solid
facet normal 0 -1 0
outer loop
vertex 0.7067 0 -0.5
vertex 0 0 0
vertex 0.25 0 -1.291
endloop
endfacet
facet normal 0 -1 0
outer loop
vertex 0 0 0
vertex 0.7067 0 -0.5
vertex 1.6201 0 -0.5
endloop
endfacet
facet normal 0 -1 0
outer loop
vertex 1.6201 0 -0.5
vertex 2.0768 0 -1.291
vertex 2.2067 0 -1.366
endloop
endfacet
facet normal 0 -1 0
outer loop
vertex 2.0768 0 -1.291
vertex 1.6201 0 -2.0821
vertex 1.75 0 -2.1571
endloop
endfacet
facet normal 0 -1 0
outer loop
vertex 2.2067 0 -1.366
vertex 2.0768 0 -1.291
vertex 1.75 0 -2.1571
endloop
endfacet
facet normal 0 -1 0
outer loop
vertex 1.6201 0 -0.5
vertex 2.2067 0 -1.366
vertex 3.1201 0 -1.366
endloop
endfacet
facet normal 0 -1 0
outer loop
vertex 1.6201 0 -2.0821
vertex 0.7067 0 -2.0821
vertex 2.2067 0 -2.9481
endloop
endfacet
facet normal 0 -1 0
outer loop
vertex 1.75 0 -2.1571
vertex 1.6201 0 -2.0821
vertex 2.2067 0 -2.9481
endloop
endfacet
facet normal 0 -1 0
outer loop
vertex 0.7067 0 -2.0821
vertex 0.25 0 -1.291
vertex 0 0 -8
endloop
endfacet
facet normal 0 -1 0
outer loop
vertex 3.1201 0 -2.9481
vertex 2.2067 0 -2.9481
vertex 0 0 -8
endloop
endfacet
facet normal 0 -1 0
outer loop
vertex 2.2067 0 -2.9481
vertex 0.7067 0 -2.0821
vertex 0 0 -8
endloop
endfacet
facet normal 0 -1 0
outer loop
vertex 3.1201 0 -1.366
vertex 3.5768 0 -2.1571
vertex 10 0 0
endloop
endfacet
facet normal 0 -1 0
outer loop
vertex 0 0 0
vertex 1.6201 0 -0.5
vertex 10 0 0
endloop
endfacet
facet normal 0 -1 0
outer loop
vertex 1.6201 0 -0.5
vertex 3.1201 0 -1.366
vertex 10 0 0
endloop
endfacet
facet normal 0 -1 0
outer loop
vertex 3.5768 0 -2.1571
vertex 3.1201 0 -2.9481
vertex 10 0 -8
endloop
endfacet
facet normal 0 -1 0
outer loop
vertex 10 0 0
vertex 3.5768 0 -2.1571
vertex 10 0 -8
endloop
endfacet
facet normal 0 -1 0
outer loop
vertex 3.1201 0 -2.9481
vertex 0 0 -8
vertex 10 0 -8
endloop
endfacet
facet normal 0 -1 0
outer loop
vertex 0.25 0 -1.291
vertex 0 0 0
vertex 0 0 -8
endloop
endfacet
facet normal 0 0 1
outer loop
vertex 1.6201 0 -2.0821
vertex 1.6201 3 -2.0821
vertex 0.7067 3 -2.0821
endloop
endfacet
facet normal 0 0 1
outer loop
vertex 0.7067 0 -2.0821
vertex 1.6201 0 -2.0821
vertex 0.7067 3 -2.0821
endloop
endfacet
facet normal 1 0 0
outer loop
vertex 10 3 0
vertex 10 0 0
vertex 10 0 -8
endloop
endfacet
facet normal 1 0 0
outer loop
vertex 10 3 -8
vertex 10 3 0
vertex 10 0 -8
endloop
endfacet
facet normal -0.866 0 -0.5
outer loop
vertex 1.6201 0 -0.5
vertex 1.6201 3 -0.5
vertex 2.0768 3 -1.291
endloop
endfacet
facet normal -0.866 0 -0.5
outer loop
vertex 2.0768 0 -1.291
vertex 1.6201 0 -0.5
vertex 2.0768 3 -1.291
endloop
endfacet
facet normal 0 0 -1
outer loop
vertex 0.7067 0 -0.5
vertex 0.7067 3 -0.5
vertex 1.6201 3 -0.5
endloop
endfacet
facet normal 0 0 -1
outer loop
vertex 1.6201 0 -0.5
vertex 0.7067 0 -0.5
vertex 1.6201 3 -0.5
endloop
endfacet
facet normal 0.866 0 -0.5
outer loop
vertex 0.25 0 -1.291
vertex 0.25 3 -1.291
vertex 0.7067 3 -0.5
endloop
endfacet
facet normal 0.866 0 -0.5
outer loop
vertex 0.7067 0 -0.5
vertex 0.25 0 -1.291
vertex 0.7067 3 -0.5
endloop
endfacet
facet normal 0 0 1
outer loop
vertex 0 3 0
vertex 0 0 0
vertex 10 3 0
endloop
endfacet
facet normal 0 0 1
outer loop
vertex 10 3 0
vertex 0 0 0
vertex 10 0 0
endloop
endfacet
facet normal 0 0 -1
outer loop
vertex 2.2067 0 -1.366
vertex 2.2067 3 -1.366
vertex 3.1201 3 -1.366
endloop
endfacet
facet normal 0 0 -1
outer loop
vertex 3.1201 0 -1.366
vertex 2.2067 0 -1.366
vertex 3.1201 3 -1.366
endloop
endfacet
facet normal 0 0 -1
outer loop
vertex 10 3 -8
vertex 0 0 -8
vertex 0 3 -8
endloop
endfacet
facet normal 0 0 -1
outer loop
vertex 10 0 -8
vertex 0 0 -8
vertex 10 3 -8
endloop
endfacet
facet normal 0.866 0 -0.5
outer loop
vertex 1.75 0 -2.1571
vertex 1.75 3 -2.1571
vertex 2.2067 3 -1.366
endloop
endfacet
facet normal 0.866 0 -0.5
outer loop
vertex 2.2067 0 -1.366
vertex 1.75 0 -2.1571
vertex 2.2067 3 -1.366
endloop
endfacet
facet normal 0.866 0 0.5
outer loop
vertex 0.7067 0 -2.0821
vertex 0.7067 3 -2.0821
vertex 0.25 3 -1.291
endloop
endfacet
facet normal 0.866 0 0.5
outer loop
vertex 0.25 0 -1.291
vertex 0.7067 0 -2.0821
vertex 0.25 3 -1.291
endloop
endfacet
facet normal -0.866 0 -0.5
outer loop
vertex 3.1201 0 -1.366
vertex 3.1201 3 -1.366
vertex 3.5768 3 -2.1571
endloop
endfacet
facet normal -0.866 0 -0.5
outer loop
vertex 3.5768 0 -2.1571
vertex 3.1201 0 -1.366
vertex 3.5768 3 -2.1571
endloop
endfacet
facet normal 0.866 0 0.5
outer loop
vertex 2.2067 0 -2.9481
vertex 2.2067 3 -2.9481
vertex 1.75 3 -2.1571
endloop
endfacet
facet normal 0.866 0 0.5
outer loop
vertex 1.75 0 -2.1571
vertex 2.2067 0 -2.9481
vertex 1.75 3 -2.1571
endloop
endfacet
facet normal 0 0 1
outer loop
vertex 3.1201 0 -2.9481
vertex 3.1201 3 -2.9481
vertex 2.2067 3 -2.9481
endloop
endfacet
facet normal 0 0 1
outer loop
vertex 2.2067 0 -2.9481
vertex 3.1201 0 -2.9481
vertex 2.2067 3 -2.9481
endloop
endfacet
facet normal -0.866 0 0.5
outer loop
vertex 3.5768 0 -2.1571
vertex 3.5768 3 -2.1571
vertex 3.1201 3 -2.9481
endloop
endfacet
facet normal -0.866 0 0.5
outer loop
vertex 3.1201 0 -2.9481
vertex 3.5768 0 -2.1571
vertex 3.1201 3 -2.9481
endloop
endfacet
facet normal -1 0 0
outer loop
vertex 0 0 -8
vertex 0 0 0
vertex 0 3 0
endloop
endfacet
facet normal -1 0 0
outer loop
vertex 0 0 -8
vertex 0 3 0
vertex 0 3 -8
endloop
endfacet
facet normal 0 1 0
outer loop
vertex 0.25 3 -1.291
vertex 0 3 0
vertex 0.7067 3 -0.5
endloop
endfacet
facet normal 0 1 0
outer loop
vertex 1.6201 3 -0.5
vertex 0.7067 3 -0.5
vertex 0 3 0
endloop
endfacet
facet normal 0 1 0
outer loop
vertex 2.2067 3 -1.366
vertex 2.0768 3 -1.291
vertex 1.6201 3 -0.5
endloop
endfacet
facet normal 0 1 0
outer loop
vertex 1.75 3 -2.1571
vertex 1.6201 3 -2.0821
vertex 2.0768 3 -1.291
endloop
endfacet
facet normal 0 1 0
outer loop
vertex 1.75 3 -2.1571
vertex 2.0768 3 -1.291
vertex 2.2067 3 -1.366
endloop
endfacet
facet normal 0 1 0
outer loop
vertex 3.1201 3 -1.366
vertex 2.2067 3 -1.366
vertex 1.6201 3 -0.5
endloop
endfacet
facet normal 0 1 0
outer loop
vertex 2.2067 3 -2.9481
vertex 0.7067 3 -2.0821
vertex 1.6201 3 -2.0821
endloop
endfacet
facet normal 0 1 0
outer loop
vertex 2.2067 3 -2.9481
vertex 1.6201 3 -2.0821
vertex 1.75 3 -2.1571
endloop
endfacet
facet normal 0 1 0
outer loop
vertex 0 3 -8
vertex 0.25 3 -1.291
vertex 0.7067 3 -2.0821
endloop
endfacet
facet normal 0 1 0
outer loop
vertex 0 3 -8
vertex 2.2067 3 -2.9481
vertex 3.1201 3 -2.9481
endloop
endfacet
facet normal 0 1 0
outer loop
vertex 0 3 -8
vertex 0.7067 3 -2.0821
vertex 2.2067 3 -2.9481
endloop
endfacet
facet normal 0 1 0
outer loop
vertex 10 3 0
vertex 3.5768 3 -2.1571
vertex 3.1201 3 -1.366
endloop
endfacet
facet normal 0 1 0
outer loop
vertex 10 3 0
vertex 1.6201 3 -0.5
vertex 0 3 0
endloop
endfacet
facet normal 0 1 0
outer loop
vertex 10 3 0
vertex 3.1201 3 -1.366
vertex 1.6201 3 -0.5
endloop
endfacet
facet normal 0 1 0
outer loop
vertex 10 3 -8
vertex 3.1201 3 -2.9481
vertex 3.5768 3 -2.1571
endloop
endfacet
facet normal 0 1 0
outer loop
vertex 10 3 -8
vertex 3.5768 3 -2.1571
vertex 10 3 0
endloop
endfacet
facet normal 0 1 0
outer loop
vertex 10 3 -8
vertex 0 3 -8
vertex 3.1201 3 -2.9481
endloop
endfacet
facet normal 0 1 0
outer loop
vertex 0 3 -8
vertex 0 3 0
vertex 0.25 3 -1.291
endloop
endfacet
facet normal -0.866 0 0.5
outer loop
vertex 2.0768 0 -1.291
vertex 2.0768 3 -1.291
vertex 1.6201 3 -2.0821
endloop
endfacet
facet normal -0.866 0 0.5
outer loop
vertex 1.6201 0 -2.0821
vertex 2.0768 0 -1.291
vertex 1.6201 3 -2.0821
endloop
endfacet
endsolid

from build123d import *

# Parameters (mm, degrees)
SKETCH1_W           = 10
SKETCH1_H           = 8
BOSS_EXTRUDE1_DEPTH = 3
CUT_EXTRUDE1_REACH  = 15.153


with BuildPart() as part:
    # Sketch1 → Boss-Extrude1 (new body)
    with BuildSketch(Plane(origin=(0, 0, 0), x_dir=(1, 0, 0), z_dir=(0, 1, 0))):
        with Locations((5, 4)):
            Rectangle(SKETCH1_W, SKETCH1_H)
    extrude(amount=BOSS_EXTRUDE1_DEPTH)

    # Sketch2 → Cut-Extrude1 (cut, up to next)
    with BuildSketch(Plane(origin=(0, 3, 0), x_dir=(1, 0, 0), z_dir=(0, 1, 0)), mode=Mode.PRIVATE) as cut_extrude1_sk1:
        Polygon((2.076794919, 1.291025404), (1.620096189, 2.082050808), (0.70669873, 2.082050808), (0.25, 1.291025404), (0.70669873, 0.5), (1.620096189, 0.5), align=None)
    cut_extrude1_tool1 = extrude(cut_extrude1_sk1.sketch, amount=-CUT_EXTRUDE1_REACH, mode=Mode.PRIVATE) & part.part
    # Sketch2 → Cut-Extrude1 (cut, up to next)
    with BuildSketch(Plane(origin=(0, 3, 0), x_dir=(1, 0, 0), z_dir=(0, 1, 0)), mode=Mode.PRIVATE) as cut_extrude1_sk2:
        Polygon((3.576794919, 2.157050808), (3.120096189, 2.948076211), (2.20669873, 2.948076211), (1.75, 2.157050808), (2.20669873, 1.366025404), (3.120096189, 1.366025404), align=None)
    cut_extrude1_tool2 = extrude(cut_extrude1_sk2.sketch, amount=-CUT_EXTRUDE1_REACH, mode=Mode.PRIVATE) & part.part
    add(cut_extrude1_tool1.solids().sort_by_distance((1.163397, 3, -1.291025))[0], mode=Mode.SUBTRACT)
    add(cut_extrude1_tool2.solids().sort_by_distance((2.663397, 3, -2.157051))[0], mode=Mode.SUBTRACT)


solid = part.part
